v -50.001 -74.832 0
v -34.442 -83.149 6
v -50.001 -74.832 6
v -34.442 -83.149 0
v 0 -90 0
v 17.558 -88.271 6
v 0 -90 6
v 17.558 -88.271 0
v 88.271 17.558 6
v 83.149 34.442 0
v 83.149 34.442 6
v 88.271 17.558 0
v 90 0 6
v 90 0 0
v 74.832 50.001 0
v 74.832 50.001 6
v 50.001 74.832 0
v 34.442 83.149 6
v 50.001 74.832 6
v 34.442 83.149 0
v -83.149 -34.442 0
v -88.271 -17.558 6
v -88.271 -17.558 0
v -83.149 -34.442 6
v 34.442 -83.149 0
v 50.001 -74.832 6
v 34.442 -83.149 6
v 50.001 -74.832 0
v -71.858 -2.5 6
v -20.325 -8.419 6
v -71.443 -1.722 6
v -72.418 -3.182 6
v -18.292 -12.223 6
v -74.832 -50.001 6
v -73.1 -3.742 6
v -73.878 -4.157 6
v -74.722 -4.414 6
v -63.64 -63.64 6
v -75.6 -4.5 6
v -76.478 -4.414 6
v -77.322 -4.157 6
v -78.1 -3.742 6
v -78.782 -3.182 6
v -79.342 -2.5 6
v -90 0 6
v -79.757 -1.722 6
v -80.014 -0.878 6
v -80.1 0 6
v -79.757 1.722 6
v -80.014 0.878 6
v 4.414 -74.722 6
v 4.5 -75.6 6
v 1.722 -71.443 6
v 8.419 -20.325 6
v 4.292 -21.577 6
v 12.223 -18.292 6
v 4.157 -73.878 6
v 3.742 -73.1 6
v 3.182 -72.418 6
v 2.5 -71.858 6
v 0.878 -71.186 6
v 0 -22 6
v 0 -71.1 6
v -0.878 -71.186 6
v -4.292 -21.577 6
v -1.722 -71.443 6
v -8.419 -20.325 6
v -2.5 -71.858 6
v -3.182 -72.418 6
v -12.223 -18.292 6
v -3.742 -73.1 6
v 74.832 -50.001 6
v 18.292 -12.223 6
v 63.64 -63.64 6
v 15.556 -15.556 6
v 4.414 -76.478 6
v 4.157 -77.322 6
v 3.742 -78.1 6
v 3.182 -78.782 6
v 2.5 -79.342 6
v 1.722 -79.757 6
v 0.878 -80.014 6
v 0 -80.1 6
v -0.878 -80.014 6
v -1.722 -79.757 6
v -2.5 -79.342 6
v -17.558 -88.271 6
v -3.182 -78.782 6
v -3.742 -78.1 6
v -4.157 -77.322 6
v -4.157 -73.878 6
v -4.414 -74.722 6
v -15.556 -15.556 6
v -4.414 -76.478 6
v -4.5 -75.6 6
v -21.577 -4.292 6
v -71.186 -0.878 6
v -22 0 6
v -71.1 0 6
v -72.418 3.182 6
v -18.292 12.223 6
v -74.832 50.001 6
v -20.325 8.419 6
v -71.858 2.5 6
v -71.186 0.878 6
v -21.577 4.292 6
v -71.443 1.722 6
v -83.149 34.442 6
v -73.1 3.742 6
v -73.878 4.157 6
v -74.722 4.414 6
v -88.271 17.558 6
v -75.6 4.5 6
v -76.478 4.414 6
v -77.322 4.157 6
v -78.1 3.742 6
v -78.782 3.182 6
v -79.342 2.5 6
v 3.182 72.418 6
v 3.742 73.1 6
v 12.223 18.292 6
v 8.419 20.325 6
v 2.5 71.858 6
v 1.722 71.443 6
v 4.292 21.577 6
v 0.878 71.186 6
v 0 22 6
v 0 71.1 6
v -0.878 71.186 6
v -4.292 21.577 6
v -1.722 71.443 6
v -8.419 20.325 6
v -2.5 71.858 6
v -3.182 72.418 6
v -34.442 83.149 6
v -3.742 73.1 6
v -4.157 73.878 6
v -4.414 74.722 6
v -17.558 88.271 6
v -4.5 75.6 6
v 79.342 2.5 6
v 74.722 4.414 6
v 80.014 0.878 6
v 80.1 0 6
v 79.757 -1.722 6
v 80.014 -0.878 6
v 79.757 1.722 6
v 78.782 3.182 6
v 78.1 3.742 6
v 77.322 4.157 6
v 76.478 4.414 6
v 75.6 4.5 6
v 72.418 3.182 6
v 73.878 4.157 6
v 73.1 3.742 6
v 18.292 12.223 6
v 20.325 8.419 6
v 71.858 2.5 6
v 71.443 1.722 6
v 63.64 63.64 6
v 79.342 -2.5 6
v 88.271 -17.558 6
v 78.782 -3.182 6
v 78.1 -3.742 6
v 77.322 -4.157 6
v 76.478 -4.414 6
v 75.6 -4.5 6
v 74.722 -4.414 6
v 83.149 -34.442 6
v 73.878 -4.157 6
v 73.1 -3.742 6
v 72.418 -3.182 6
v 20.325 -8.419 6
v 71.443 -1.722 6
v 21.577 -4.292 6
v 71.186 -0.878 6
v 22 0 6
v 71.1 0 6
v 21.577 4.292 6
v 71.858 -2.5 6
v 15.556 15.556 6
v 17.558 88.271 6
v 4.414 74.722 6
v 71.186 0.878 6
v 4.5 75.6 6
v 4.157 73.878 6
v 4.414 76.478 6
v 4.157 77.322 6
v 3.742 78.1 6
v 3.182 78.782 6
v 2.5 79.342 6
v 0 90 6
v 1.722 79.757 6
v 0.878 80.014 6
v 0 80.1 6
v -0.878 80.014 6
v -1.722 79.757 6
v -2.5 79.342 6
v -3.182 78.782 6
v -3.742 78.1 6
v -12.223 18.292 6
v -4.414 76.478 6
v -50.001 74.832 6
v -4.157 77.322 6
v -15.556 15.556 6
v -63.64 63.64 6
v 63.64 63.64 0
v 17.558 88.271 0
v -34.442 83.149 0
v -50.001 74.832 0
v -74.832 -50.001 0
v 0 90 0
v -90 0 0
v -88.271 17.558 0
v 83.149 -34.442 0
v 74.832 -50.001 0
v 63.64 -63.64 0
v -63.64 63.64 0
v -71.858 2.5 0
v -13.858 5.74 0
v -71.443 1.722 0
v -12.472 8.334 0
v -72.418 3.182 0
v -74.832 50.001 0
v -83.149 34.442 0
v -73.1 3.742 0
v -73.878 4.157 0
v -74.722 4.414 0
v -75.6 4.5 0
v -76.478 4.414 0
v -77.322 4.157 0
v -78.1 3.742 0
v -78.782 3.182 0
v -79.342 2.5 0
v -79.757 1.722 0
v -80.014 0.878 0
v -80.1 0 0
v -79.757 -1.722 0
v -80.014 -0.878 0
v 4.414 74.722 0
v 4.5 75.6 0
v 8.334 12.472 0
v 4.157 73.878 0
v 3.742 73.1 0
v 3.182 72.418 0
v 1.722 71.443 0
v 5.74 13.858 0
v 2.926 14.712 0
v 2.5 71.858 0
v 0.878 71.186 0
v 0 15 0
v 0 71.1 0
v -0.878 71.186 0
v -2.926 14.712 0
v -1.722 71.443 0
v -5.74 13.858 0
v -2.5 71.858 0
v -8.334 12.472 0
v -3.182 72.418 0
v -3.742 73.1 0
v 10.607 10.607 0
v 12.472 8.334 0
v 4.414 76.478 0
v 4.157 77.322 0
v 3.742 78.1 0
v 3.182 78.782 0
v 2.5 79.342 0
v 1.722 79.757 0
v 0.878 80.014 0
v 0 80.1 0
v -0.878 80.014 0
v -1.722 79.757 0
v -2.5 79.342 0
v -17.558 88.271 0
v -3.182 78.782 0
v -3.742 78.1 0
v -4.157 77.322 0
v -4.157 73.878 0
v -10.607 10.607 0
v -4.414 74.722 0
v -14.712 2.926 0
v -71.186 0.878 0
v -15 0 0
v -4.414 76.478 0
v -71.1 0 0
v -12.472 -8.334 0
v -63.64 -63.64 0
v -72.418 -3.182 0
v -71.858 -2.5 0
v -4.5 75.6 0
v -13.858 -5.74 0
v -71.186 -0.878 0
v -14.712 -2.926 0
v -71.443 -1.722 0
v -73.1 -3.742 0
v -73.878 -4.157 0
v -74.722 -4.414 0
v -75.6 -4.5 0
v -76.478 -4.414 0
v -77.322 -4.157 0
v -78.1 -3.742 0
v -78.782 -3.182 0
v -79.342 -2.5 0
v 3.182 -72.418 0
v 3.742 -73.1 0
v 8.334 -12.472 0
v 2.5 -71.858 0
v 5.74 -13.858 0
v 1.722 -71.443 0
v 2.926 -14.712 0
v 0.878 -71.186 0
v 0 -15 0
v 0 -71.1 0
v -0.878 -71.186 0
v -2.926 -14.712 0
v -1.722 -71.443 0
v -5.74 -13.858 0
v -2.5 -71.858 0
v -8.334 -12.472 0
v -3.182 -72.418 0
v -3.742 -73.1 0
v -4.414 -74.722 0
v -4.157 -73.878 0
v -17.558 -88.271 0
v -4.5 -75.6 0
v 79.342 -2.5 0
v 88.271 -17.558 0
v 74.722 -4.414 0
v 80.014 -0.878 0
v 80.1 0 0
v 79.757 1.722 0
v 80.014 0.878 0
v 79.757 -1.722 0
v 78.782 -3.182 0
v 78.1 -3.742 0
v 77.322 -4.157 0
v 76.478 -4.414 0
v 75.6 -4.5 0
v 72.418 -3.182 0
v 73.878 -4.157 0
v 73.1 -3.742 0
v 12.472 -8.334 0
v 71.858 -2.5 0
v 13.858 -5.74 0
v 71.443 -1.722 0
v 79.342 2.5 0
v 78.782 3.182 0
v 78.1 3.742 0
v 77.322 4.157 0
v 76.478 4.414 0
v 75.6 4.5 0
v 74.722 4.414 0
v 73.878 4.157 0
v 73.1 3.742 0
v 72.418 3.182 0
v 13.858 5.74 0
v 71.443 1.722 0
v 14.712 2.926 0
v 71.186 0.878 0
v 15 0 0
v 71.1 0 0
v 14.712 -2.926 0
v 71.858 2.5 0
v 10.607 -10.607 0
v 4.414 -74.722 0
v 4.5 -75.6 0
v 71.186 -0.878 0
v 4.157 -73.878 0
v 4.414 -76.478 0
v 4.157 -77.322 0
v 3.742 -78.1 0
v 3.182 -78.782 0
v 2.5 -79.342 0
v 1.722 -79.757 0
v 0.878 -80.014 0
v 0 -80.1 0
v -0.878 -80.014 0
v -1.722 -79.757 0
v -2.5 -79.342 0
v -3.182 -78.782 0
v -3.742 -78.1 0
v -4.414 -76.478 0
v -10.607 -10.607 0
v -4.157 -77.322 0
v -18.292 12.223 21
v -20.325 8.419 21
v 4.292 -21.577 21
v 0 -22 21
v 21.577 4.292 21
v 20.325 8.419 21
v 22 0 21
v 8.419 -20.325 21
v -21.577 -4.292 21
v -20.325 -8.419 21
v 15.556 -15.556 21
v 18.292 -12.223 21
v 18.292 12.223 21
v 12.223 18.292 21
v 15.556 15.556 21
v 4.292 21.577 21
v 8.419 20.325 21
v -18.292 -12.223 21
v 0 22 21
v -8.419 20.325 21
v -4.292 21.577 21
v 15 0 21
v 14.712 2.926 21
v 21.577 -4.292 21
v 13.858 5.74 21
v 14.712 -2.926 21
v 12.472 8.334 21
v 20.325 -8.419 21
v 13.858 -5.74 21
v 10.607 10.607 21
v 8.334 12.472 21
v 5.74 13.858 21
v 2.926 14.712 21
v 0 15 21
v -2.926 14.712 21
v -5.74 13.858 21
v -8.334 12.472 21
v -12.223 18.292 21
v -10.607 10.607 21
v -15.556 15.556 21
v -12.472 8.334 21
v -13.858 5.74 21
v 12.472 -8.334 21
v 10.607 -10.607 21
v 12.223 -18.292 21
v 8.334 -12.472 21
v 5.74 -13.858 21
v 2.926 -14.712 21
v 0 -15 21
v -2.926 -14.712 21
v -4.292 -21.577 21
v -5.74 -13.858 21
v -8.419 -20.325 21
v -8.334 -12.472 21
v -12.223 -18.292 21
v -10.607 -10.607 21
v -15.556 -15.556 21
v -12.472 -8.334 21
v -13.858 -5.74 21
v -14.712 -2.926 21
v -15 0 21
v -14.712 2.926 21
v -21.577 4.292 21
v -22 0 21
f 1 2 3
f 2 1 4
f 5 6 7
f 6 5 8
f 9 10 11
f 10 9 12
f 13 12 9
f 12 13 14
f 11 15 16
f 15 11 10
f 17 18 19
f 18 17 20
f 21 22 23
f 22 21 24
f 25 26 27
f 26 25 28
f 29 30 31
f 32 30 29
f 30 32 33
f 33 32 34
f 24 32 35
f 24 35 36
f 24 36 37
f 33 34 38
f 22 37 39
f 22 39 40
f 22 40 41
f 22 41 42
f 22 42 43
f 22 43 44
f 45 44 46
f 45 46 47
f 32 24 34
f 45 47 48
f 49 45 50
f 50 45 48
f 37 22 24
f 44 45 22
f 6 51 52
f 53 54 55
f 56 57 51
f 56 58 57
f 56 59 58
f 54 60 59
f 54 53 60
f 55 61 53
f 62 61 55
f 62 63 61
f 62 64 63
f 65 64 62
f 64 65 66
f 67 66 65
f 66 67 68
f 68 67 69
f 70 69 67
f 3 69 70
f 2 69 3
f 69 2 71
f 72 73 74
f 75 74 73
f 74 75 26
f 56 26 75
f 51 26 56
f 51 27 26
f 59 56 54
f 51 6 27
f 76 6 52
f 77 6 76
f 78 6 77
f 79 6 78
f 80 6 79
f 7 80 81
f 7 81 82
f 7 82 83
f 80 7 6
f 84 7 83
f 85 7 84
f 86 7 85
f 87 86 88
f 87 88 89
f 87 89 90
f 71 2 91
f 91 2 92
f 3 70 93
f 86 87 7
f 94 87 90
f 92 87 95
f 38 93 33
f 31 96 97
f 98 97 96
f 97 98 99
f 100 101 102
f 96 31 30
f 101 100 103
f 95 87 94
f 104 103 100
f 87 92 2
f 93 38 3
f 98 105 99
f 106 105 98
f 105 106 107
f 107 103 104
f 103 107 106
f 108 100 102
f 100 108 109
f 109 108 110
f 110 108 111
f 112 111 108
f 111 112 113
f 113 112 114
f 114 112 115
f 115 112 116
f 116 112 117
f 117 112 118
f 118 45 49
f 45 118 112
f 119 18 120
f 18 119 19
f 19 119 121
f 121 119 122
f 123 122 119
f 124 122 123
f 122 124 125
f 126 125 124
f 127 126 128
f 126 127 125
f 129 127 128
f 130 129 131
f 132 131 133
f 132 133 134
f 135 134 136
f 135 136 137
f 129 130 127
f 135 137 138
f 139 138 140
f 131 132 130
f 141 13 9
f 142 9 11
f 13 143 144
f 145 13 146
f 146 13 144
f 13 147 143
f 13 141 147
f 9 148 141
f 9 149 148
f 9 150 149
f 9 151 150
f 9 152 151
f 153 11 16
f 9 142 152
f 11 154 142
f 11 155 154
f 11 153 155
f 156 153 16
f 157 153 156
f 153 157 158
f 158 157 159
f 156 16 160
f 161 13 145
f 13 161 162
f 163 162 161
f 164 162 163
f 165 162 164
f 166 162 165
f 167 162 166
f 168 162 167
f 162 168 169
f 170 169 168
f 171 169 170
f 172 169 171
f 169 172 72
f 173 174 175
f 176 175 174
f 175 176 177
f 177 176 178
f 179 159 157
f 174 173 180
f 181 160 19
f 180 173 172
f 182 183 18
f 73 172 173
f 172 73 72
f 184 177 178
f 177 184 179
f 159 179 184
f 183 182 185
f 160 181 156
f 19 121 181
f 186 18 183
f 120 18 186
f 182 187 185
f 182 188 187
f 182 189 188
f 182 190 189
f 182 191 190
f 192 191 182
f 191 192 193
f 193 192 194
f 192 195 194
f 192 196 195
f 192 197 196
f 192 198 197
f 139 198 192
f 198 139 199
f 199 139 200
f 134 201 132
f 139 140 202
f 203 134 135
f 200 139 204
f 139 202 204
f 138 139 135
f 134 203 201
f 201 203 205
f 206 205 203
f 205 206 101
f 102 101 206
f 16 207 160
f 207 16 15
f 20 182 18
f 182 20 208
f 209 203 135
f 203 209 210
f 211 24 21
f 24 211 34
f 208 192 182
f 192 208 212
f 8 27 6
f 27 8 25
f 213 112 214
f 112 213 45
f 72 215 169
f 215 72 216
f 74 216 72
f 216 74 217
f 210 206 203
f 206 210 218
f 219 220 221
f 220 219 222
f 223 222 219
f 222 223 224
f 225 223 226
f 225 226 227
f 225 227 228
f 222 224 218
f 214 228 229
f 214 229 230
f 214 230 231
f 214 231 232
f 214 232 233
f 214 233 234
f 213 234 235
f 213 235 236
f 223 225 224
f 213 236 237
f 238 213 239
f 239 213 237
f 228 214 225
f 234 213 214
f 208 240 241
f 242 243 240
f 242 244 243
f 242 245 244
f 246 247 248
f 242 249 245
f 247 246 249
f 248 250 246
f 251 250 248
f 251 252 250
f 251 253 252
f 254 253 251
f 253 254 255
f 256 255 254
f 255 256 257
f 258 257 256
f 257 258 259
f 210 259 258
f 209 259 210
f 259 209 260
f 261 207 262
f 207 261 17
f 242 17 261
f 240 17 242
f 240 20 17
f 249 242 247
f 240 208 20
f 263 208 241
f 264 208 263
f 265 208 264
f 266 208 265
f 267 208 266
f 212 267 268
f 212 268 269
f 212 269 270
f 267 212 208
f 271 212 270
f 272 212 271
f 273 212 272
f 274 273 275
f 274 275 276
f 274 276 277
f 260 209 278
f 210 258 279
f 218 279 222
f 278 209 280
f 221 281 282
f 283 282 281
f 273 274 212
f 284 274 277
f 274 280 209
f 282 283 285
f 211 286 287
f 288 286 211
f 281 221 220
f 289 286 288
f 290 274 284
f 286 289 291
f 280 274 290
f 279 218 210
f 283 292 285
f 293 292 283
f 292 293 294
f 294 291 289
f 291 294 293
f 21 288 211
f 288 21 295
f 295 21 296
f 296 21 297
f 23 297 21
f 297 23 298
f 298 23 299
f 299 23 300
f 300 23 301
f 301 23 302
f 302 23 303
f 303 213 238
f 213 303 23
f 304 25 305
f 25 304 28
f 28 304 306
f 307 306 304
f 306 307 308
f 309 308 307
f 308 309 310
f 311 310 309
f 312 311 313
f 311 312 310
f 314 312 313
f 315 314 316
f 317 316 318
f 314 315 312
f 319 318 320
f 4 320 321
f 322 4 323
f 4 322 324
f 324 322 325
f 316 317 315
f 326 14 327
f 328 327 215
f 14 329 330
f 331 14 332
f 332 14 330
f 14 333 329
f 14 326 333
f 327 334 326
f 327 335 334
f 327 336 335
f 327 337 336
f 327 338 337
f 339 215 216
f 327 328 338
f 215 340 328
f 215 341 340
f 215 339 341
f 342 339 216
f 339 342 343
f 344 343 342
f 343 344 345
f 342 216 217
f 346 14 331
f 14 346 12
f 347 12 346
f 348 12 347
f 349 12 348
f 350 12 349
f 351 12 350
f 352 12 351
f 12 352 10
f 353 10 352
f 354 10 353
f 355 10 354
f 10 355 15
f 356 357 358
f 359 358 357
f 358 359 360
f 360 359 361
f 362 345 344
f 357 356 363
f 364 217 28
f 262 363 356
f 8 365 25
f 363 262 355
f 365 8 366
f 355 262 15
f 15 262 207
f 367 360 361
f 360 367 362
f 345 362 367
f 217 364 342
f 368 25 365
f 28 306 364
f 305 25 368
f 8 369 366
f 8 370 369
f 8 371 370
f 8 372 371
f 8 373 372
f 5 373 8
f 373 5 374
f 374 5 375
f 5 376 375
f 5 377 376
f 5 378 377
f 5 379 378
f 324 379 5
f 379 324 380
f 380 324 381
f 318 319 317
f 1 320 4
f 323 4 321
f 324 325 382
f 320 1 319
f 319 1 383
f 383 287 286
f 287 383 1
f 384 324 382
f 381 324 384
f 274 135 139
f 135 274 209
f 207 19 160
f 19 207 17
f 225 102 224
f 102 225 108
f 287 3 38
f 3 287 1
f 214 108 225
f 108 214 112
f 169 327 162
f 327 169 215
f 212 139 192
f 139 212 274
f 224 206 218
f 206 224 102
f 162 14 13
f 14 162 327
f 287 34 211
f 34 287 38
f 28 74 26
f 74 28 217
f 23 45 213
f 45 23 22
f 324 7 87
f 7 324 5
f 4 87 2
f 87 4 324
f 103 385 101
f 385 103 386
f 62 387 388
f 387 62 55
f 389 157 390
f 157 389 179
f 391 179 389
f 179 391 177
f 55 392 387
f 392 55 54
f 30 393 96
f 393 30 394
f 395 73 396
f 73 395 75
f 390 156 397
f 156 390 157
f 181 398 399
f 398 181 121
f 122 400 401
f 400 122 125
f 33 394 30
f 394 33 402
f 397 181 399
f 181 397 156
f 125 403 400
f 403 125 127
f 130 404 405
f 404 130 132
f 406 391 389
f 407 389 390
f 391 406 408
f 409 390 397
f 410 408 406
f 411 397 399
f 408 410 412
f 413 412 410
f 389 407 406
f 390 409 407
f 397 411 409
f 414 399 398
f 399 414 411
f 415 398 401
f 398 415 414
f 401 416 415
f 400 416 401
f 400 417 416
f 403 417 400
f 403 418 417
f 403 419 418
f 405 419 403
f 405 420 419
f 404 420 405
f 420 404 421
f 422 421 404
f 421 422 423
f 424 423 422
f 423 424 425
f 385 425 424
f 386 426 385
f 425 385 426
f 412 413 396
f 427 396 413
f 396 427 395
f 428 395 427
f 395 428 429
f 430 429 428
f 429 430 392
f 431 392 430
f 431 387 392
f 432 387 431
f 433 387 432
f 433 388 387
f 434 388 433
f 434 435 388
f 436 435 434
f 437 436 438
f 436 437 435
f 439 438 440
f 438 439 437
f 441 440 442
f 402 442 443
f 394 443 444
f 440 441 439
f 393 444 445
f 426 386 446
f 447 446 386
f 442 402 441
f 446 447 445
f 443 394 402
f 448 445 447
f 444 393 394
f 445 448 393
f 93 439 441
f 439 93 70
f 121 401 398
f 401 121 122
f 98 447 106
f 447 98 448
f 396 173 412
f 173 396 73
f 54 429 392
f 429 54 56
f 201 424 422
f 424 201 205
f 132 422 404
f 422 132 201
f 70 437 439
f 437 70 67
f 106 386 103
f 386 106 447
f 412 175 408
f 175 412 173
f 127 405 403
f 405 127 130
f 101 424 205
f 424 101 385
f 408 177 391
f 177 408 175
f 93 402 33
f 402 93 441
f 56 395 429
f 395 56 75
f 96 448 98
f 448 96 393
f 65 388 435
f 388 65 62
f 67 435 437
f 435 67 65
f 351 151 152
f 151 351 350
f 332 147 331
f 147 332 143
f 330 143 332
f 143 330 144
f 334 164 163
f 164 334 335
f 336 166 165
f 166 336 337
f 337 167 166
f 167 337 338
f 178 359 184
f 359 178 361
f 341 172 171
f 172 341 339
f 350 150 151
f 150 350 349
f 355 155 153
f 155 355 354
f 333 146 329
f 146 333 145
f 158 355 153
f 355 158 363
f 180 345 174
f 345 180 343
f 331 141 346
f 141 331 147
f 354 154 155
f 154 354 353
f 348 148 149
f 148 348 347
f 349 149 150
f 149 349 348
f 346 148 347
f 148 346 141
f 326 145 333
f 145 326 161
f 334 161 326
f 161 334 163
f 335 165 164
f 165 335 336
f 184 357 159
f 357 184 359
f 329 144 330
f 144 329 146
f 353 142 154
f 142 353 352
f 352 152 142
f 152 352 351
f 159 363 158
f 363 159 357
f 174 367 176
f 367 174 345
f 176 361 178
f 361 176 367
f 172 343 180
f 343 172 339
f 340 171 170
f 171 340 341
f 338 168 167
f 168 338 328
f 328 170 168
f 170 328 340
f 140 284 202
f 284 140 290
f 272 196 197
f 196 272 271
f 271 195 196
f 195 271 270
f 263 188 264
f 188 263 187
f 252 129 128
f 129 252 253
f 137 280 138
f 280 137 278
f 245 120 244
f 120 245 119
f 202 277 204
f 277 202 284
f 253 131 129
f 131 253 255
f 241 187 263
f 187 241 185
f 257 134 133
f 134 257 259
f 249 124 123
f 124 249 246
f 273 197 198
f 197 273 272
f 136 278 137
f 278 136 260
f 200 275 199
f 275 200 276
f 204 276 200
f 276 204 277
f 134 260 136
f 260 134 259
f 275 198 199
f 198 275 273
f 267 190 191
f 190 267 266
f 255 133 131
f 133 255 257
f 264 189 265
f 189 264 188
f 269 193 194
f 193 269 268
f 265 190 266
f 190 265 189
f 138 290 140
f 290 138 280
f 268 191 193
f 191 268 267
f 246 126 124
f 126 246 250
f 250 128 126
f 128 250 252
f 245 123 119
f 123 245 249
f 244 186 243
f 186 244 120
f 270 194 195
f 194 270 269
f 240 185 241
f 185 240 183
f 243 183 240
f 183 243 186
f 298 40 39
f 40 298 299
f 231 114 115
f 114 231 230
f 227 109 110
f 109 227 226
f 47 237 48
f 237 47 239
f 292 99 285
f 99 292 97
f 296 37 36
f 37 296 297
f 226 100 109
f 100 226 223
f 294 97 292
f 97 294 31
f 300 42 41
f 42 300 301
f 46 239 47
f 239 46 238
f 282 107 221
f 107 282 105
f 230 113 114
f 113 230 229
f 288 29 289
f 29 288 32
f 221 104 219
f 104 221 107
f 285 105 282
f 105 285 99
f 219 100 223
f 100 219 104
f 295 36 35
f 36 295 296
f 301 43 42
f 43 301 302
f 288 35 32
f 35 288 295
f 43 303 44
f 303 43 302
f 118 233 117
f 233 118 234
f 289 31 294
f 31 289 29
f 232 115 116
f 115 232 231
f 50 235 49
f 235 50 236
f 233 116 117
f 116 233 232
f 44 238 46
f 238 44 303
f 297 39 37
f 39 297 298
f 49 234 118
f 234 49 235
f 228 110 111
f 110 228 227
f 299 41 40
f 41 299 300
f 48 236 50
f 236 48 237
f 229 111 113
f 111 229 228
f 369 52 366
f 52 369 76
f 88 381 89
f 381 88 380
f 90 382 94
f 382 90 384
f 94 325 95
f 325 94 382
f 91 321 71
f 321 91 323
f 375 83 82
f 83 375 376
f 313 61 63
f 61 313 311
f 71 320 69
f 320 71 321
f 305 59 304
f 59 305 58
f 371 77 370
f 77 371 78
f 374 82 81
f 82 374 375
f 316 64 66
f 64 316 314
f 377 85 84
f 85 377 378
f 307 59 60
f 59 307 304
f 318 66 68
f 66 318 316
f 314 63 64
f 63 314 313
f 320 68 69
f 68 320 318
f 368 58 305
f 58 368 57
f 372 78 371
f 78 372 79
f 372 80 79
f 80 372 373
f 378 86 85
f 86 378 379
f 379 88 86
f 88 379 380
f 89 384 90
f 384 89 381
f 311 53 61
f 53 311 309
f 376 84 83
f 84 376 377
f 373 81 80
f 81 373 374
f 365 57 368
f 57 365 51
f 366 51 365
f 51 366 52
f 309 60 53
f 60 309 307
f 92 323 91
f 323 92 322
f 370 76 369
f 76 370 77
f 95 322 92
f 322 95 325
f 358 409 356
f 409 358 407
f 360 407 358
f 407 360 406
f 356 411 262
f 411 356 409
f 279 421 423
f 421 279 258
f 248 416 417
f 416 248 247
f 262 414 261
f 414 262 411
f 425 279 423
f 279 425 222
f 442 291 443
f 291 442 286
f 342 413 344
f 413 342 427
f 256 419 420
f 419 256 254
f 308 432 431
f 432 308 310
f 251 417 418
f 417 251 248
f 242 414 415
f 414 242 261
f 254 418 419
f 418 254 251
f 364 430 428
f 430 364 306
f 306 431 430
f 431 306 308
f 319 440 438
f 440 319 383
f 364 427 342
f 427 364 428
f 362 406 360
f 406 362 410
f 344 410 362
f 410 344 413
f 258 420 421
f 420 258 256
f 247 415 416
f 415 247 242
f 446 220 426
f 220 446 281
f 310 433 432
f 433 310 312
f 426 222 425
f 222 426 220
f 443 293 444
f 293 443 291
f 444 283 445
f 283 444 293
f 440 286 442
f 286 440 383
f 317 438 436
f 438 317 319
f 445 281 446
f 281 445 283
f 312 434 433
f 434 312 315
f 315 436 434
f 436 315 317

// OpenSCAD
$fn = 32;

// ----------------------------------------------------------------------
// Bolt-circle flange: 180 mm outside, 4 bolt holes, bore 30 mm
// ----------------------------------------------------------------------

// --- parameters (mm) ---
flange_d = 180;           // flange outside diameter
flange_t = 6;             // flange thickness
bolts = 4;                // number of bolt holes
bolt_d = 9;               // bolt clearance
bolt_r = 75.6;            // bolt circle radius
bore_d = 30;              // centre bore
hub_d = 44;               // raised hub diameter
hub_h = 15;               // raised hub height

module body() {
  cylinder(h = flange_t, d = flange_d);
  /* raised hub, sunk 1 mm into the flange */
  translate([0, 0, flange_t - 1]) cylinder(h = hub_h + 1, d = hub_d);
}

difference() {
  body();
  /* bolt circle */
  for (i = [0 : bolts - 1]) rotate([0, 0, i * 360 / bolts]) translate([bolt_r, 0, -1]) cylinder(h = flange_t + hub_h + 3, d = bolt_d);
  translate([0, 0, -1]) cylinder(h = flange_t + hub_h + 3, d = bore_d);
}
